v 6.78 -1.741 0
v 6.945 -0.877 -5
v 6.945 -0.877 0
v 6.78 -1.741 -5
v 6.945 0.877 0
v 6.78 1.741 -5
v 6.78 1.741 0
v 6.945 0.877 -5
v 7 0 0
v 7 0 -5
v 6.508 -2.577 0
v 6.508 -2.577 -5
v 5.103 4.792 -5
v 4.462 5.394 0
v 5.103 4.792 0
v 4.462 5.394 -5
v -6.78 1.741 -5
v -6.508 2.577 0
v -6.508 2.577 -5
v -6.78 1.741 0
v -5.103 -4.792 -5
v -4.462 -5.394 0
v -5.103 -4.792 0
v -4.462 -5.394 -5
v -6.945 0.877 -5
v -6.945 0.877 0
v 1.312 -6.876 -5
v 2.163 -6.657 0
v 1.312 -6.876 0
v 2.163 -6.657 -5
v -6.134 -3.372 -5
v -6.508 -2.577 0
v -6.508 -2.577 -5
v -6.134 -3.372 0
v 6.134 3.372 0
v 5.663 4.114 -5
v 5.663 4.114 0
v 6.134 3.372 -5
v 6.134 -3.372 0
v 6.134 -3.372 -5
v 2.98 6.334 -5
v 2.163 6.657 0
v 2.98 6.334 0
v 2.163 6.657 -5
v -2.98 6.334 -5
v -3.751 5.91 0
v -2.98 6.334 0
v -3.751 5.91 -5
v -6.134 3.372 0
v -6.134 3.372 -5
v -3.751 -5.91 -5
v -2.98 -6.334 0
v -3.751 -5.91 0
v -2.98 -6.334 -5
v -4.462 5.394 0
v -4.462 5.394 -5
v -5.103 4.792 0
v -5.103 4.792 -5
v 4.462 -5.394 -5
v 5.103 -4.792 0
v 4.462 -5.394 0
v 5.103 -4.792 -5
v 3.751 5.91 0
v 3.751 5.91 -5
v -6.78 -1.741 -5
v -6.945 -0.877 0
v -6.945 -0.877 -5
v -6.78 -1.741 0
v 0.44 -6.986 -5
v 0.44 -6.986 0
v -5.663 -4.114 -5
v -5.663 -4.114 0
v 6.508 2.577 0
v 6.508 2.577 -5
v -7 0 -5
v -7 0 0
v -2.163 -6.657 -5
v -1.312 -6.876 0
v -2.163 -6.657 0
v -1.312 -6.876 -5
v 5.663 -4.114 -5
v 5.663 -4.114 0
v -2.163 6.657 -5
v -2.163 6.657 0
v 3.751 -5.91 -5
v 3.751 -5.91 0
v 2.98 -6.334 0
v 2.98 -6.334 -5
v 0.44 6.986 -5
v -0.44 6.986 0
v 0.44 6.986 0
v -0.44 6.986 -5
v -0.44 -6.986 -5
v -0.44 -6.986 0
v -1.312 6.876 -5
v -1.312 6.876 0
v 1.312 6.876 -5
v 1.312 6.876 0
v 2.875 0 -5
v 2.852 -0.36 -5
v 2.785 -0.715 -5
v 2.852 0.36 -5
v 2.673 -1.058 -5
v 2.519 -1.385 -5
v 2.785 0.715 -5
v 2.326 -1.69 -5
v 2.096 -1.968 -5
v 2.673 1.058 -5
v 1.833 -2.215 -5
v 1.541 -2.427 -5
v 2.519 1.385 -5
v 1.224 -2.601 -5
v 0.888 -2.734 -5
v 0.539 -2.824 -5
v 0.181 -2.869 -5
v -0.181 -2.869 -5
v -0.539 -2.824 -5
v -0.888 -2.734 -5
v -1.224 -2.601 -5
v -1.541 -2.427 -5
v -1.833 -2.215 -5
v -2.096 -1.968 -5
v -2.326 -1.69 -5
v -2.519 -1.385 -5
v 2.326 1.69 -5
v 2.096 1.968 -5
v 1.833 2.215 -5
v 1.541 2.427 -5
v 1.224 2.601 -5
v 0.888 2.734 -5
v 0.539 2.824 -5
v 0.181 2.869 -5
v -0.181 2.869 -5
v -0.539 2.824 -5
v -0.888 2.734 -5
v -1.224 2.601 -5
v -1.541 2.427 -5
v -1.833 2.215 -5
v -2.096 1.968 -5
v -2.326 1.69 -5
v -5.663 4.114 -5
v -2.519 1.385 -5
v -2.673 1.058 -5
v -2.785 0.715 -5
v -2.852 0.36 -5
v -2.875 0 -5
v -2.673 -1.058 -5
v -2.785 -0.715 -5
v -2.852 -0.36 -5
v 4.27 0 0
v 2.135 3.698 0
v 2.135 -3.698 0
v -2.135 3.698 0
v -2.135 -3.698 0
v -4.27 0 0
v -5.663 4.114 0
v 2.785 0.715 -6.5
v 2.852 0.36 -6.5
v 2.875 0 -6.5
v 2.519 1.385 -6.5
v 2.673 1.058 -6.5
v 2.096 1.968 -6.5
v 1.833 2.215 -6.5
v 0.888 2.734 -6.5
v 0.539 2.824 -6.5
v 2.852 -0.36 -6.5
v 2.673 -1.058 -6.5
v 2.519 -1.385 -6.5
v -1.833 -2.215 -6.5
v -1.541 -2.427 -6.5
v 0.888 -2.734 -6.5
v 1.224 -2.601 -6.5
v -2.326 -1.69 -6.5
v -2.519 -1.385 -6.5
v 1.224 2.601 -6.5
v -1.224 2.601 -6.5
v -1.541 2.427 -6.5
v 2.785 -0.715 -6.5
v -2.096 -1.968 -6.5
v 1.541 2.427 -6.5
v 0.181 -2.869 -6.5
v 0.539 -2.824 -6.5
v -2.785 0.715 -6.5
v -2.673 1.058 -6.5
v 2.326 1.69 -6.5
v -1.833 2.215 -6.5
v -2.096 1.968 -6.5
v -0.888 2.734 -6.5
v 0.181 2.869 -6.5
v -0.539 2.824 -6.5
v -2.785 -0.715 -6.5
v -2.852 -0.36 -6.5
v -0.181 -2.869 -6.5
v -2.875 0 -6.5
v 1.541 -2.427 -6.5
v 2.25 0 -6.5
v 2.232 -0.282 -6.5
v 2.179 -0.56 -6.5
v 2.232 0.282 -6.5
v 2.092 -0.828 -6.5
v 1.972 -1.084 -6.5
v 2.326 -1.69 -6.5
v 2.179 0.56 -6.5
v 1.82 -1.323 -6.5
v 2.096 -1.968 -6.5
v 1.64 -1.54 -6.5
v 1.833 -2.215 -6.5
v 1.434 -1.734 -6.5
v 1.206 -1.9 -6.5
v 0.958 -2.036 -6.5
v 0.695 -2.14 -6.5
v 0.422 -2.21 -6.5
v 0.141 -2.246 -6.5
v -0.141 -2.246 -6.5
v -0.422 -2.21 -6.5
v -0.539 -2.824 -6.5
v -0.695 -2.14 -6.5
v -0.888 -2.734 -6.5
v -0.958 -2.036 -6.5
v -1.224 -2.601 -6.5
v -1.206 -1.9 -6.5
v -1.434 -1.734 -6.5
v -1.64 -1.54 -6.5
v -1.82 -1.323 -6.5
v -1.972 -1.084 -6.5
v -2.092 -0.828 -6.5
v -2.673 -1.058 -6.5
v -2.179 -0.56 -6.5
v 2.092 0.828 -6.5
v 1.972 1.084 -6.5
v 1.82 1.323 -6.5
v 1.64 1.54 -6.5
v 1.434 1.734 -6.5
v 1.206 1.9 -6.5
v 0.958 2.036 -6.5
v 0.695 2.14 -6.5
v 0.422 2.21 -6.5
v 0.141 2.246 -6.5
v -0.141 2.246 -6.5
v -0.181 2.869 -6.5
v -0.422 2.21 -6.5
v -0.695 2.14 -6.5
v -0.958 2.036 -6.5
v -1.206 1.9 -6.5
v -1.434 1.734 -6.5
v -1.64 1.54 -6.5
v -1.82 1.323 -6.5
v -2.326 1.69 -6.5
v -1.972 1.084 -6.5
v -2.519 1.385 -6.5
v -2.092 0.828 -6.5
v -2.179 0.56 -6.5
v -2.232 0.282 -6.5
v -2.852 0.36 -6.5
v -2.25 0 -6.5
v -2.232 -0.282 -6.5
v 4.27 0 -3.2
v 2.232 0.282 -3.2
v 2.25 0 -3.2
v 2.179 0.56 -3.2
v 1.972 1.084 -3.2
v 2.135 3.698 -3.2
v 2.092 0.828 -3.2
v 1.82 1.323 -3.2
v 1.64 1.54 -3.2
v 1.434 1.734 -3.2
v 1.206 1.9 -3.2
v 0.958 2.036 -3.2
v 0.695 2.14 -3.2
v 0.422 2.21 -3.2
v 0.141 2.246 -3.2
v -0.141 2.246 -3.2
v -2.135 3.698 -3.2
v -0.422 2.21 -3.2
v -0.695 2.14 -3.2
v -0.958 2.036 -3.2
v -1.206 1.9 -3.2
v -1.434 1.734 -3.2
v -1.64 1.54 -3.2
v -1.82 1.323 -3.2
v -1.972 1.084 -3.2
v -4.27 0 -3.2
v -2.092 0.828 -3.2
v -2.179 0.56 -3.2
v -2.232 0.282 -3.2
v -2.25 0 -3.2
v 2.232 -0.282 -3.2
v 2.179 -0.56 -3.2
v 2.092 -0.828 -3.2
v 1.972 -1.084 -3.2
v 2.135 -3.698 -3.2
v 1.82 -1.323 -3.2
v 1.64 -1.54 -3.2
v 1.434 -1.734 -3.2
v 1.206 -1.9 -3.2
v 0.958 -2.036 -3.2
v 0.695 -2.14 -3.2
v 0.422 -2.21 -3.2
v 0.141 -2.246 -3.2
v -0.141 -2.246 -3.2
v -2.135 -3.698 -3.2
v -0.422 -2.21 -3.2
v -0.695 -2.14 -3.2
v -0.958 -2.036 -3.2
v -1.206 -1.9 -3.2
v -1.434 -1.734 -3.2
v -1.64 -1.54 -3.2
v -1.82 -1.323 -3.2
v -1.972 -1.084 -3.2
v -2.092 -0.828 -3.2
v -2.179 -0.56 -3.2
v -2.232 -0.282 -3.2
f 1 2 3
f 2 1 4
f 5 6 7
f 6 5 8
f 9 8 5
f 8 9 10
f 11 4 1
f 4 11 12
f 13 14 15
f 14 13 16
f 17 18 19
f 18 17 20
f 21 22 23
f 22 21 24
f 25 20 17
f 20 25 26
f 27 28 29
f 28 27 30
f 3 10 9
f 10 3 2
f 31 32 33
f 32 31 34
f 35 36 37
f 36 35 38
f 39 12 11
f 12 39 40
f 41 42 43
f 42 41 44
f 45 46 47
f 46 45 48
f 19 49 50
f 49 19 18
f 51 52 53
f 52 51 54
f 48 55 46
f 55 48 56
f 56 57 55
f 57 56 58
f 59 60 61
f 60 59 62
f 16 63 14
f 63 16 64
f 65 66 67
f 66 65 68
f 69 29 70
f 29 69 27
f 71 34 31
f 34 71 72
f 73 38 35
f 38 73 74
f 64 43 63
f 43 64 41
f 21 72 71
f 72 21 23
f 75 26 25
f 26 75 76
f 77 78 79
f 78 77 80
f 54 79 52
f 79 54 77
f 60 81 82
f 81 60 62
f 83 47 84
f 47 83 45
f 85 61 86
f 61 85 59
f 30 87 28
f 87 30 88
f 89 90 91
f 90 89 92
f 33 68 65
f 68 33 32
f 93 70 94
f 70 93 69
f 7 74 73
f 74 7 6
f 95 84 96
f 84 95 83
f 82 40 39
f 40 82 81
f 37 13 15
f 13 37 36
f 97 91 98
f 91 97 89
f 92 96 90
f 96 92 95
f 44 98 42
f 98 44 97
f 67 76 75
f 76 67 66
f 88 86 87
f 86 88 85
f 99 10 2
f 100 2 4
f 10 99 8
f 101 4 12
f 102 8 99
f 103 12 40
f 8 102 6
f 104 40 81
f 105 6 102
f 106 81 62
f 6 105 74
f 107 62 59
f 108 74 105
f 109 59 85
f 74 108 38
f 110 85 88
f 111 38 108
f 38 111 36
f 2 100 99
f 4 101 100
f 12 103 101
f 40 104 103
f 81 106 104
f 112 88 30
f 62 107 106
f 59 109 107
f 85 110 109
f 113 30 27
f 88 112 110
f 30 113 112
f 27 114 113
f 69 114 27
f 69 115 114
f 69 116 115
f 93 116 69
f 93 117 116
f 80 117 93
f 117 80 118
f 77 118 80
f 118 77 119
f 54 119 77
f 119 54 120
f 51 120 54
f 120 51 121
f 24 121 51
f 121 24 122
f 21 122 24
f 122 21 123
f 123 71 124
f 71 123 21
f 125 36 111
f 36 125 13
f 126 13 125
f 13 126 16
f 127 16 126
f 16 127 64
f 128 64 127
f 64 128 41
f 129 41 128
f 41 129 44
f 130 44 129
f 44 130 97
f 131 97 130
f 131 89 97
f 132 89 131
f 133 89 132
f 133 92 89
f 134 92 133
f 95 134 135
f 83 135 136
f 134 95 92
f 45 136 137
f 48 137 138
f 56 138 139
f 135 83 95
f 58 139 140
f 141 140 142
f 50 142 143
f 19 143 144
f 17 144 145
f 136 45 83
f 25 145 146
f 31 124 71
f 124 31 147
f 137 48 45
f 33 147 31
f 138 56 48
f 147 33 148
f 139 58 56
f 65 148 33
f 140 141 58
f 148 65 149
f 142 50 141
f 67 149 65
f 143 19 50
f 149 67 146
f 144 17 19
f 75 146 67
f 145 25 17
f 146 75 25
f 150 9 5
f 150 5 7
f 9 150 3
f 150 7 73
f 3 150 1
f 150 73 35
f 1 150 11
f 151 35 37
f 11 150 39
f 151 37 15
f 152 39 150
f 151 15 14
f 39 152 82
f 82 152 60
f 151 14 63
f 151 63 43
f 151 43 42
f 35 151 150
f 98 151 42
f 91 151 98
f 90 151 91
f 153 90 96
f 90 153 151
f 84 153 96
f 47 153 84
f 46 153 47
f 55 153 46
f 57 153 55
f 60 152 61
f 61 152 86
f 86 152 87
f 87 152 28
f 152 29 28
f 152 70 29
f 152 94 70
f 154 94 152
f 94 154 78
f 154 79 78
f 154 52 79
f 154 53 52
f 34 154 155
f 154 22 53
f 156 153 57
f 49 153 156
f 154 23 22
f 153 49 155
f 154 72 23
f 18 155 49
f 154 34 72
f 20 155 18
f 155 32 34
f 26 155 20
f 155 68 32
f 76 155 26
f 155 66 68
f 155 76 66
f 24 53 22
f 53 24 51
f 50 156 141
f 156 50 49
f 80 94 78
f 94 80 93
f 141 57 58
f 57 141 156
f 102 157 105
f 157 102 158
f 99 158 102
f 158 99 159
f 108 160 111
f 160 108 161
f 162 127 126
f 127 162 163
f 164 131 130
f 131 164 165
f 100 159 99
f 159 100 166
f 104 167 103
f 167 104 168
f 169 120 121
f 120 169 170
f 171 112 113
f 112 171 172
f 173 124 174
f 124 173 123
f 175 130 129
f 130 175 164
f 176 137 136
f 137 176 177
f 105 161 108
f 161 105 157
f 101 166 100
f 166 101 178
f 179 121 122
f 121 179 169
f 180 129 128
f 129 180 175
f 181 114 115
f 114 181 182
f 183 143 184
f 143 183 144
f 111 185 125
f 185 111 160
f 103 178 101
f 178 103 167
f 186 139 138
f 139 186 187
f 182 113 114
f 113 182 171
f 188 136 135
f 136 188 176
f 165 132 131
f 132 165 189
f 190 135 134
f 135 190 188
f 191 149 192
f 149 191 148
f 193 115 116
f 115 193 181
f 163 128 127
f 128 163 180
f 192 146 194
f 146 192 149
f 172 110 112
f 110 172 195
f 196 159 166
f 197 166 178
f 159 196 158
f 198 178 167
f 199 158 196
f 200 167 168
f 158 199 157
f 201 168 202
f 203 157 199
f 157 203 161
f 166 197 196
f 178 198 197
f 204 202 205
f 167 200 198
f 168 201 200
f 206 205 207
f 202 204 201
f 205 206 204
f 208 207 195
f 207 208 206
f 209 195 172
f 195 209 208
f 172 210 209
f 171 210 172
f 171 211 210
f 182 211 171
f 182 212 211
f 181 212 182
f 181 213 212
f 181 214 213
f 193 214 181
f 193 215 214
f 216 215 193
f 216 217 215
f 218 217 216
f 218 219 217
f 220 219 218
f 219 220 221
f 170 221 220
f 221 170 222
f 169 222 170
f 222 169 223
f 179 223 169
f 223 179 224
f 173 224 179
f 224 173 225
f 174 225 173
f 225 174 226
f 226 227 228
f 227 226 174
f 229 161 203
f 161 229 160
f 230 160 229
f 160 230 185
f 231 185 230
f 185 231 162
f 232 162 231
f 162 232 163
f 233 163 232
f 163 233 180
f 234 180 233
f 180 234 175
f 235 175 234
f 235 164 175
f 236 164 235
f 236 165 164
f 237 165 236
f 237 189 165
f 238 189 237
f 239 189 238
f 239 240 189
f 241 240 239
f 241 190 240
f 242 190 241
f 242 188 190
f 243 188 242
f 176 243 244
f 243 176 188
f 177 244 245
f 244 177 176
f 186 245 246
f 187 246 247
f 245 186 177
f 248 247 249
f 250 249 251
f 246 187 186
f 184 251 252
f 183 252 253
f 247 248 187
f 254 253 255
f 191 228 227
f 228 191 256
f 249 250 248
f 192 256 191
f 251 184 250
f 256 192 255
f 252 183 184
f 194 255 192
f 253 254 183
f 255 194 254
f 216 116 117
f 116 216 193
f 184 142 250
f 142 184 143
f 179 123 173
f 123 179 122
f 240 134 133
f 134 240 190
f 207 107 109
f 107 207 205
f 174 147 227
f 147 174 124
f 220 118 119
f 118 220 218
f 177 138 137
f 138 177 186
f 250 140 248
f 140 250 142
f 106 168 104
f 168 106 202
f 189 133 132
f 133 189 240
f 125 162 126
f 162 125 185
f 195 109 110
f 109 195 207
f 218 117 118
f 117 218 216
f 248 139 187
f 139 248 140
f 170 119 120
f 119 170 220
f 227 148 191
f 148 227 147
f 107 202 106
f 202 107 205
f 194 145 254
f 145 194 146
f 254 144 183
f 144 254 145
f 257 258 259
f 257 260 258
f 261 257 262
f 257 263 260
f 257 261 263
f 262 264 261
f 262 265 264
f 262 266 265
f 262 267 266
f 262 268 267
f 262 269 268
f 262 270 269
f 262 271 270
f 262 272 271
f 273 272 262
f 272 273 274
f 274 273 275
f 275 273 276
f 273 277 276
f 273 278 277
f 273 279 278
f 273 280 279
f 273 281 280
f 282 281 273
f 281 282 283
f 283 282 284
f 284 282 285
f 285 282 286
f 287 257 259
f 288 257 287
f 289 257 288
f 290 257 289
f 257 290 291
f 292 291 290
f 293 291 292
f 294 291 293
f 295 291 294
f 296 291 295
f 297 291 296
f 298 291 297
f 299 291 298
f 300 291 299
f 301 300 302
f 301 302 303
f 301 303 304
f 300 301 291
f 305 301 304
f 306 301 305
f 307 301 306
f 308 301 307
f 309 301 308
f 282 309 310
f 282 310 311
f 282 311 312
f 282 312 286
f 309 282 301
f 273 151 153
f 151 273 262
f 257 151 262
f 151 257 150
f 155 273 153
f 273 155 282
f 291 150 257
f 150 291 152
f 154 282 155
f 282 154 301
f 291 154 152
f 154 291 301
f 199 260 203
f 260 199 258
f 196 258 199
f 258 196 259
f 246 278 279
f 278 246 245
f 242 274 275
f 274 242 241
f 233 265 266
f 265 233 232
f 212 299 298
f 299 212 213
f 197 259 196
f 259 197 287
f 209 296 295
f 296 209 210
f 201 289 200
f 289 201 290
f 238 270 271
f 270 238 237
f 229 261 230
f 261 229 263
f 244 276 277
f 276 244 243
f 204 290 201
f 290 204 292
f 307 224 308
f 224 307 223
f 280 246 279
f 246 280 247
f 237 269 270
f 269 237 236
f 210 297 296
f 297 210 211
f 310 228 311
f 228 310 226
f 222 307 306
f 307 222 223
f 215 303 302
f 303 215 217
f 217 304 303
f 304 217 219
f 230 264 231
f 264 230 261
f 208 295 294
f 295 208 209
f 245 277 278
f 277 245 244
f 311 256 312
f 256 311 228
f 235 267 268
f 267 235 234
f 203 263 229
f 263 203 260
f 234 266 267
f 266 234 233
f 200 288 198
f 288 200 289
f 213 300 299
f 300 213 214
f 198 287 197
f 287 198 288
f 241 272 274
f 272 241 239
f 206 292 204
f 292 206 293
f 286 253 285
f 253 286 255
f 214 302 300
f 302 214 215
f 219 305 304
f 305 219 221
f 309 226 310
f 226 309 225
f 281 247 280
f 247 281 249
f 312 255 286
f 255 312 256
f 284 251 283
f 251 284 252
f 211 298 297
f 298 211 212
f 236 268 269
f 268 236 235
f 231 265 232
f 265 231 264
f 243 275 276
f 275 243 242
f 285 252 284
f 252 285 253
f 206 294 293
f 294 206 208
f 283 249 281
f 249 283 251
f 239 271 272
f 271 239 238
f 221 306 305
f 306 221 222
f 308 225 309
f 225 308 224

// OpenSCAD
$fn = 50;


difference() {
	union() {
		translate(v = [0, 0, -5.0000000000]) {
			cylinder(h = 5.0000000000, r = 7.0000000000);
		}
		#translate(v = [0, 0, -6.5000000000]) {
			cylinder(h = 6.5000000000, r = 2.8750000000);
		}
	}
	union() {
		translate(v = [0, 0, 0]) {
			rotate(a = [0, 0, 0]) {
				difference() {
					union() {
						translate(v = [0, 0, -3.2000000000]) {
							linear_extrude(height = 3.2000000000) {
								polygon(points = [[4.2698000000, 0.0000000000], [2.1349000000, 3.6977552691], [-2.1349000000, 3.6977552691], [-4.2698000000, 0.0000000000], [-2.1349000000, -3.6977552691], [2.1349000000, -3.6977552691]]);
							}
						}
					}
					union();
				}
			}
		}
		#translate(v = [0, 0, -100.0000000000]) {
			cylinder(h = 200, r = 2.2500000000);
		}
	}
}
